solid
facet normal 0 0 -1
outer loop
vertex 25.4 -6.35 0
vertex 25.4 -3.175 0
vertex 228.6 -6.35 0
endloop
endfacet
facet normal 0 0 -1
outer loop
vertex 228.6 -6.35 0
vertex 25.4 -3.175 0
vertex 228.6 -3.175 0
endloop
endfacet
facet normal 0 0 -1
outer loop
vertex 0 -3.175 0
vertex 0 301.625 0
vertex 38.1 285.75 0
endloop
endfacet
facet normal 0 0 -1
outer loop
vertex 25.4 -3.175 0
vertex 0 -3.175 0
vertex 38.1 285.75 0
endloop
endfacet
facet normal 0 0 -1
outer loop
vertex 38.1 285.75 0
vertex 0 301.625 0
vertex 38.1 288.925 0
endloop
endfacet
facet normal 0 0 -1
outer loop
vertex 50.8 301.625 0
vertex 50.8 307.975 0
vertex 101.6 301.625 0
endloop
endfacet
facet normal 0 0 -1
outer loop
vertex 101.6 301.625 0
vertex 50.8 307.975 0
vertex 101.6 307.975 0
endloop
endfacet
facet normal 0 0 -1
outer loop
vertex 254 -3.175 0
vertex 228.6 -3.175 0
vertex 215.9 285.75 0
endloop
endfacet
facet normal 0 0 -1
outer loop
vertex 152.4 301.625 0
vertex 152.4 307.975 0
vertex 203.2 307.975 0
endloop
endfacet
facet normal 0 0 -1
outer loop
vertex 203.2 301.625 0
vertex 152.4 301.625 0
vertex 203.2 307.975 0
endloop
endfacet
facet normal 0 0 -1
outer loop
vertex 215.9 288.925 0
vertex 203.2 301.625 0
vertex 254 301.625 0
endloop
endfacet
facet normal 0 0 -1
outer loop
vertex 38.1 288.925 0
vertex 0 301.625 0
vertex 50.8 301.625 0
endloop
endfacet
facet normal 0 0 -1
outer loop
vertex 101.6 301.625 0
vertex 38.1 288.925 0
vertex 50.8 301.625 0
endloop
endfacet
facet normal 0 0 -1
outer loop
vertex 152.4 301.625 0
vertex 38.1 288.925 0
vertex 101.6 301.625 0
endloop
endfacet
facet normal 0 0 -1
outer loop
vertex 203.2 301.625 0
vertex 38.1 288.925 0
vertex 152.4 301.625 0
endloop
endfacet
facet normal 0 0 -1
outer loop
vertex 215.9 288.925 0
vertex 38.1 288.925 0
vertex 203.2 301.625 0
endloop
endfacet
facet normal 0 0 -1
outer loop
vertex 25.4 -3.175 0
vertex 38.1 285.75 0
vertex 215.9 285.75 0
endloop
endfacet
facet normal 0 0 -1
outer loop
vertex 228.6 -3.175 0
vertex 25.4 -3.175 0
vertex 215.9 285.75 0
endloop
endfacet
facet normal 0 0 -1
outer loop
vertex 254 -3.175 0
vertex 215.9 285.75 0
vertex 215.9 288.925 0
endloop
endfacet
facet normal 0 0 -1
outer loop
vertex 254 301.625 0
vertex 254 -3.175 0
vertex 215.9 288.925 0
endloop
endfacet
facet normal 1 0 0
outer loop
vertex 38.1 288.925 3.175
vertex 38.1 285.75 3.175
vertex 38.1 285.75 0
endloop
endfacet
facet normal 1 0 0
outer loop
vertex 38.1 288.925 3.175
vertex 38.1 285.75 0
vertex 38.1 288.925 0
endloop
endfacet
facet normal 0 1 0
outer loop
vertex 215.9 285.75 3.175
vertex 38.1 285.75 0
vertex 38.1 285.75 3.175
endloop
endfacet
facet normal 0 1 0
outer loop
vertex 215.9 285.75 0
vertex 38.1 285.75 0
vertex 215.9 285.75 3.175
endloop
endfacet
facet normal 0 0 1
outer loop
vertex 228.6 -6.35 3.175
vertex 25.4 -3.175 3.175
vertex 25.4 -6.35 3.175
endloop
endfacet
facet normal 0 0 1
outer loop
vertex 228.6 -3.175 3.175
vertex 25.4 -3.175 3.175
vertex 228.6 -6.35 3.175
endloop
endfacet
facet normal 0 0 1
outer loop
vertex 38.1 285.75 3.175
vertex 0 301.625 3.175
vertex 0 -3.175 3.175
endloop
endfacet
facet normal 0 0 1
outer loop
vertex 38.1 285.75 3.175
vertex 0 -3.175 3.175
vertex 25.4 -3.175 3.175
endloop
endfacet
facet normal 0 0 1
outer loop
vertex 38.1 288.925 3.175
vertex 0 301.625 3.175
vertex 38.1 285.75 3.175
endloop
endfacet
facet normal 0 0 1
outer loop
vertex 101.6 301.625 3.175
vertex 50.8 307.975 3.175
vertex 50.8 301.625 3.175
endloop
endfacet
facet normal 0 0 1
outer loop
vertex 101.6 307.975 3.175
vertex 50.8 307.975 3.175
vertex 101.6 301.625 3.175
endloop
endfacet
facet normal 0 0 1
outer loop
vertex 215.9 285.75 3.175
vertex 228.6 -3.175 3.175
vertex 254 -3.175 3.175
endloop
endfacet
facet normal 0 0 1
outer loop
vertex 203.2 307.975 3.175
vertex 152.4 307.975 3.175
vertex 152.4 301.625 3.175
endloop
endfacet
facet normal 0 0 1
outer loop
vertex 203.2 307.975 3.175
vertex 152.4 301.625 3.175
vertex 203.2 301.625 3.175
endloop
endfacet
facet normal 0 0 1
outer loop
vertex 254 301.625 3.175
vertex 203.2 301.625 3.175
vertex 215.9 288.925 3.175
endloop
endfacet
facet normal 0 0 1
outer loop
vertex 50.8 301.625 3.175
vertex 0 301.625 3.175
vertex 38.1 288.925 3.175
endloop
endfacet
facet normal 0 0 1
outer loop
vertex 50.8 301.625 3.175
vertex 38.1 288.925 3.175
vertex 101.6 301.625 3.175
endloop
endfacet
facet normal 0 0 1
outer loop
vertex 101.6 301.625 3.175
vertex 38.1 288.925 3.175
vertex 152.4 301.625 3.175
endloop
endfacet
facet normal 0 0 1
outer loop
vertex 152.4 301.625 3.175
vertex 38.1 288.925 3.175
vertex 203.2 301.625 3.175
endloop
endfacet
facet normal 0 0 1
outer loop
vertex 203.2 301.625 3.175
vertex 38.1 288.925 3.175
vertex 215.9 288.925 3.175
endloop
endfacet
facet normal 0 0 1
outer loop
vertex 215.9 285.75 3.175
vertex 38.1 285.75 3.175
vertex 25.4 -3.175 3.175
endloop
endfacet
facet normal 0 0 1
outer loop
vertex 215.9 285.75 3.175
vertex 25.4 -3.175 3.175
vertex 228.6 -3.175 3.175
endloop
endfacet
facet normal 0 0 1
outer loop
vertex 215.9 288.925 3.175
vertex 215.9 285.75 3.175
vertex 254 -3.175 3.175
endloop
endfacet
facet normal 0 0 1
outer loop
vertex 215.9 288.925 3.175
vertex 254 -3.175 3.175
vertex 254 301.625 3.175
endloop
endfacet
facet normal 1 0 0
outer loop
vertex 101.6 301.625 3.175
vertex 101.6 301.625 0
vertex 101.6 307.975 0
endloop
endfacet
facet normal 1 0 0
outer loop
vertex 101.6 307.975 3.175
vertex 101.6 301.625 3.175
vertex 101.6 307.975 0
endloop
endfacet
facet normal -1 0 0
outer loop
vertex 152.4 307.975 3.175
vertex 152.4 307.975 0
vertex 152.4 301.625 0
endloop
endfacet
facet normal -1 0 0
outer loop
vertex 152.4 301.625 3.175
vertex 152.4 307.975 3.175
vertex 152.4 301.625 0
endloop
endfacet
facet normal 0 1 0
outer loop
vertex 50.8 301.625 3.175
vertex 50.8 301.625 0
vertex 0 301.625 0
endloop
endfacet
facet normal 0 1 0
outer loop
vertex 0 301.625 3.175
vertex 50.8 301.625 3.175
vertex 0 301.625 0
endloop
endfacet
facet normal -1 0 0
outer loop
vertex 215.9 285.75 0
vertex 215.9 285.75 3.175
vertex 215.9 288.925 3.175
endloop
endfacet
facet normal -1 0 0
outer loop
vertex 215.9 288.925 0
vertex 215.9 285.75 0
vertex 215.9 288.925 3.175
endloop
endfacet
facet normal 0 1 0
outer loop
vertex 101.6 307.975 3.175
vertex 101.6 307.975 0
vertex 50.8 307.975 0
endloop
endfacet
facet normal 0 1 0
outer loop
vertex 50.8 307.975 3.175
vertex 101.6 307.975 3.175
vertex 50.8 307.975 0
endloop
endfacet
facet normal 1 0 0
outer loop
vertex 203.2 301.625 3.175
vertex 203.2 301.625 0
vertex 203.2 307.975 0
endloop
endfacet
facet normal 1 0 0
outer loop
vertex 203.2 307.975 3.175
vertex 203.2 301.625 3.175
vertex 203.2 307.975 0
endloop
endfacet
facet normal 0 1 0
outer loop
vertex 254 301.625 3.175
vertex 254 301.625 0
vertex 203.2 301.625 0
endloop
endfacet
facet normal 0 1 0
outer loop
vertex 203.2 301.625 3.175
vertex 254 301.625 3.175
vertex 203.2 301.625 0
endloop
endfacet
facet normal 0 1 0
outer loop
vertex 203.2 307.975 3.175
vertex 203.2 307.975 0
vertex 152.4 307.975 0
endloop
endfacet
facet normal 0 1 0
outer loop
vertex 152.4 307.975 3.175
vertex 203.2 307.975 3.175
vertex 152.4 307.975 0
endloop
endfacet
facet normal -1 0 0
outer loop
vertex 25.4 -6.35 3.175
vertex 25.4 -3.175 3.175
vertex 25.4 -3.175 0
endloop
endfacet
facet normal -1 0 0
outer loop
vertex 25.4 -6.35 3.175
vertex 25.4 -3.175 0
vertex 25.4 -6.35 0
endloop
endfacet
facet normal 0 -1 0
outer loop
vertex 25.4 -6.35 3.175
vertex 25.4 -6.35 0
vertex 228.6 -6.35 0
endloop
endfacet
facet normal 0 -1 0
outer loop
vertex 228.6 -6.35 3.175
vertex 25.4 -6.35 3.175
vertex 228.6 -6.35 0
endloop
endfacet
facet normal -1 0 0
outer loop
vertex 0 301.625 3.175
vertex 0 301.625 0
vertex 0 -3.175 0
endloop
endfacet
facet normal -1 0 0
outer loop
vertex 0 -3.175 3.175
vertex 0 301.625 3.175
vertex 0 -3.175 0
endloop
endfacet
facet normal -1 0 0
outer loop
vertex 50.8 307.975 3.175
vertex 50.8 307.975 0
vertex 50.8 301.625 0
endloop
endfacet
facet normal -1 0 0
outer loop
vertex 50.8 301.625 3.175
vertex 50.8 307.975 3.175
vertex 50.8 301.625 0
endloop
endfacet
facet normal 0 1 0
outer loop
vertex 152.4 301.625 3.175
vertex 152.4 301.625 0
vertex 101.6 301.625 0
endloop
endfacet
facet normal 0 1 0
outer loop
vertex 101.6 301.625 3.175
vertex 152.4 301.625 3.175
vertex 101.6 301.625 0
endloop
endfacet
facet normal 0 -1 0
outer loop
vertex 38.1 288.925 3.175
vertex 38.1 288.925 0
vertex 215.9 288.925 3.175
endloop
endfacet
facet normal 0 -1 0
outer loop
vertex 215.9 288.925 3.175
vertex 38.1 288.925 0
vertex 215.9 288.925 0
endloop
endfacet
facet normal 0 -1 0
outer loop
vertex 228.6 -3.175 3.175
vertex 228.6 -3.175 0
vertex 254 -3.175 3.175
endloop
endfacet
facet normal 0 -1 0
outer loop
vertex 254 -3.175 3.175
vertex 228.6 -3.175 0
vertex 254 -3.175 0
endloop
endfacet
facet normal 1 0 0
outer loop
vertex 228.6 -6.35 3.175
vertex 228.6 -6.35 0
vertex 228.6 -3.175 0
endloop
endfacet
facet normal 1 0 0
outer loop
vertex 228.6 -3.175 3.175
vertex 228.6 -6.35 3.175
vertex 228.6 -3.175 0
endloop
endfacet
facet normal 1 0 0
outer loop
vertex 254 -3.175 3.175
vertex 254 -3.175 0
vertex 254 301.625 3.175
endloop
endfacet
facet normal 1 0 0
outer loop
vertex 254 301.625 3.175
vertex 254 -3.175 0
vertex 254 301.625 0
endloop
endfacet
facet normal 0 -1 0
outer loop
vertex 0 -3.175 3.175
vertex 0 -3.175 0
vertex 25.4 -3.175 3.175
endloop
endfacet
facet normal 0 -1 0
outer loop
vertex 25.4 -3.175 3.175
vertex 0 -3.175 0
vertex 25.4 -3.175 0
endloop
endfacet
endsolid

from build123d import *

# Parameters (mm, degrees)
SKETCH1_W           = 177.8
SKETCH1_H           = 3.175
BOSS_EXTRUDE1_DEPTH = 3.175


with BuildPart() as part:
    # Sketch1 → Boss-Extrude1 (new body)
    with BuildSketch(Plane.XY):
        Polygon((228.6, -6.35), (228.6, -3.175), (254, -3.175), (254, 301.625), (203.2, 301.625), (203.2, 307.975), (152.4, 307.975), (152.4, 301.625), (101.6, 301.625), (101.6, 307.975), (50.8, 307.975), (50.8, 301.625), (0, 301.625), (0, -3.175), (25.4, -3.175), (25.4, -6.35), align=None)
        with Locations((127, 287.3375)):
            Rectangle(SKETCH1_W, SKETCH1_H, mode=Mode.SUBTRACT)
    extrude(amount=BOSS_EXTRUDE1_DEPTH)


solid = part.part
